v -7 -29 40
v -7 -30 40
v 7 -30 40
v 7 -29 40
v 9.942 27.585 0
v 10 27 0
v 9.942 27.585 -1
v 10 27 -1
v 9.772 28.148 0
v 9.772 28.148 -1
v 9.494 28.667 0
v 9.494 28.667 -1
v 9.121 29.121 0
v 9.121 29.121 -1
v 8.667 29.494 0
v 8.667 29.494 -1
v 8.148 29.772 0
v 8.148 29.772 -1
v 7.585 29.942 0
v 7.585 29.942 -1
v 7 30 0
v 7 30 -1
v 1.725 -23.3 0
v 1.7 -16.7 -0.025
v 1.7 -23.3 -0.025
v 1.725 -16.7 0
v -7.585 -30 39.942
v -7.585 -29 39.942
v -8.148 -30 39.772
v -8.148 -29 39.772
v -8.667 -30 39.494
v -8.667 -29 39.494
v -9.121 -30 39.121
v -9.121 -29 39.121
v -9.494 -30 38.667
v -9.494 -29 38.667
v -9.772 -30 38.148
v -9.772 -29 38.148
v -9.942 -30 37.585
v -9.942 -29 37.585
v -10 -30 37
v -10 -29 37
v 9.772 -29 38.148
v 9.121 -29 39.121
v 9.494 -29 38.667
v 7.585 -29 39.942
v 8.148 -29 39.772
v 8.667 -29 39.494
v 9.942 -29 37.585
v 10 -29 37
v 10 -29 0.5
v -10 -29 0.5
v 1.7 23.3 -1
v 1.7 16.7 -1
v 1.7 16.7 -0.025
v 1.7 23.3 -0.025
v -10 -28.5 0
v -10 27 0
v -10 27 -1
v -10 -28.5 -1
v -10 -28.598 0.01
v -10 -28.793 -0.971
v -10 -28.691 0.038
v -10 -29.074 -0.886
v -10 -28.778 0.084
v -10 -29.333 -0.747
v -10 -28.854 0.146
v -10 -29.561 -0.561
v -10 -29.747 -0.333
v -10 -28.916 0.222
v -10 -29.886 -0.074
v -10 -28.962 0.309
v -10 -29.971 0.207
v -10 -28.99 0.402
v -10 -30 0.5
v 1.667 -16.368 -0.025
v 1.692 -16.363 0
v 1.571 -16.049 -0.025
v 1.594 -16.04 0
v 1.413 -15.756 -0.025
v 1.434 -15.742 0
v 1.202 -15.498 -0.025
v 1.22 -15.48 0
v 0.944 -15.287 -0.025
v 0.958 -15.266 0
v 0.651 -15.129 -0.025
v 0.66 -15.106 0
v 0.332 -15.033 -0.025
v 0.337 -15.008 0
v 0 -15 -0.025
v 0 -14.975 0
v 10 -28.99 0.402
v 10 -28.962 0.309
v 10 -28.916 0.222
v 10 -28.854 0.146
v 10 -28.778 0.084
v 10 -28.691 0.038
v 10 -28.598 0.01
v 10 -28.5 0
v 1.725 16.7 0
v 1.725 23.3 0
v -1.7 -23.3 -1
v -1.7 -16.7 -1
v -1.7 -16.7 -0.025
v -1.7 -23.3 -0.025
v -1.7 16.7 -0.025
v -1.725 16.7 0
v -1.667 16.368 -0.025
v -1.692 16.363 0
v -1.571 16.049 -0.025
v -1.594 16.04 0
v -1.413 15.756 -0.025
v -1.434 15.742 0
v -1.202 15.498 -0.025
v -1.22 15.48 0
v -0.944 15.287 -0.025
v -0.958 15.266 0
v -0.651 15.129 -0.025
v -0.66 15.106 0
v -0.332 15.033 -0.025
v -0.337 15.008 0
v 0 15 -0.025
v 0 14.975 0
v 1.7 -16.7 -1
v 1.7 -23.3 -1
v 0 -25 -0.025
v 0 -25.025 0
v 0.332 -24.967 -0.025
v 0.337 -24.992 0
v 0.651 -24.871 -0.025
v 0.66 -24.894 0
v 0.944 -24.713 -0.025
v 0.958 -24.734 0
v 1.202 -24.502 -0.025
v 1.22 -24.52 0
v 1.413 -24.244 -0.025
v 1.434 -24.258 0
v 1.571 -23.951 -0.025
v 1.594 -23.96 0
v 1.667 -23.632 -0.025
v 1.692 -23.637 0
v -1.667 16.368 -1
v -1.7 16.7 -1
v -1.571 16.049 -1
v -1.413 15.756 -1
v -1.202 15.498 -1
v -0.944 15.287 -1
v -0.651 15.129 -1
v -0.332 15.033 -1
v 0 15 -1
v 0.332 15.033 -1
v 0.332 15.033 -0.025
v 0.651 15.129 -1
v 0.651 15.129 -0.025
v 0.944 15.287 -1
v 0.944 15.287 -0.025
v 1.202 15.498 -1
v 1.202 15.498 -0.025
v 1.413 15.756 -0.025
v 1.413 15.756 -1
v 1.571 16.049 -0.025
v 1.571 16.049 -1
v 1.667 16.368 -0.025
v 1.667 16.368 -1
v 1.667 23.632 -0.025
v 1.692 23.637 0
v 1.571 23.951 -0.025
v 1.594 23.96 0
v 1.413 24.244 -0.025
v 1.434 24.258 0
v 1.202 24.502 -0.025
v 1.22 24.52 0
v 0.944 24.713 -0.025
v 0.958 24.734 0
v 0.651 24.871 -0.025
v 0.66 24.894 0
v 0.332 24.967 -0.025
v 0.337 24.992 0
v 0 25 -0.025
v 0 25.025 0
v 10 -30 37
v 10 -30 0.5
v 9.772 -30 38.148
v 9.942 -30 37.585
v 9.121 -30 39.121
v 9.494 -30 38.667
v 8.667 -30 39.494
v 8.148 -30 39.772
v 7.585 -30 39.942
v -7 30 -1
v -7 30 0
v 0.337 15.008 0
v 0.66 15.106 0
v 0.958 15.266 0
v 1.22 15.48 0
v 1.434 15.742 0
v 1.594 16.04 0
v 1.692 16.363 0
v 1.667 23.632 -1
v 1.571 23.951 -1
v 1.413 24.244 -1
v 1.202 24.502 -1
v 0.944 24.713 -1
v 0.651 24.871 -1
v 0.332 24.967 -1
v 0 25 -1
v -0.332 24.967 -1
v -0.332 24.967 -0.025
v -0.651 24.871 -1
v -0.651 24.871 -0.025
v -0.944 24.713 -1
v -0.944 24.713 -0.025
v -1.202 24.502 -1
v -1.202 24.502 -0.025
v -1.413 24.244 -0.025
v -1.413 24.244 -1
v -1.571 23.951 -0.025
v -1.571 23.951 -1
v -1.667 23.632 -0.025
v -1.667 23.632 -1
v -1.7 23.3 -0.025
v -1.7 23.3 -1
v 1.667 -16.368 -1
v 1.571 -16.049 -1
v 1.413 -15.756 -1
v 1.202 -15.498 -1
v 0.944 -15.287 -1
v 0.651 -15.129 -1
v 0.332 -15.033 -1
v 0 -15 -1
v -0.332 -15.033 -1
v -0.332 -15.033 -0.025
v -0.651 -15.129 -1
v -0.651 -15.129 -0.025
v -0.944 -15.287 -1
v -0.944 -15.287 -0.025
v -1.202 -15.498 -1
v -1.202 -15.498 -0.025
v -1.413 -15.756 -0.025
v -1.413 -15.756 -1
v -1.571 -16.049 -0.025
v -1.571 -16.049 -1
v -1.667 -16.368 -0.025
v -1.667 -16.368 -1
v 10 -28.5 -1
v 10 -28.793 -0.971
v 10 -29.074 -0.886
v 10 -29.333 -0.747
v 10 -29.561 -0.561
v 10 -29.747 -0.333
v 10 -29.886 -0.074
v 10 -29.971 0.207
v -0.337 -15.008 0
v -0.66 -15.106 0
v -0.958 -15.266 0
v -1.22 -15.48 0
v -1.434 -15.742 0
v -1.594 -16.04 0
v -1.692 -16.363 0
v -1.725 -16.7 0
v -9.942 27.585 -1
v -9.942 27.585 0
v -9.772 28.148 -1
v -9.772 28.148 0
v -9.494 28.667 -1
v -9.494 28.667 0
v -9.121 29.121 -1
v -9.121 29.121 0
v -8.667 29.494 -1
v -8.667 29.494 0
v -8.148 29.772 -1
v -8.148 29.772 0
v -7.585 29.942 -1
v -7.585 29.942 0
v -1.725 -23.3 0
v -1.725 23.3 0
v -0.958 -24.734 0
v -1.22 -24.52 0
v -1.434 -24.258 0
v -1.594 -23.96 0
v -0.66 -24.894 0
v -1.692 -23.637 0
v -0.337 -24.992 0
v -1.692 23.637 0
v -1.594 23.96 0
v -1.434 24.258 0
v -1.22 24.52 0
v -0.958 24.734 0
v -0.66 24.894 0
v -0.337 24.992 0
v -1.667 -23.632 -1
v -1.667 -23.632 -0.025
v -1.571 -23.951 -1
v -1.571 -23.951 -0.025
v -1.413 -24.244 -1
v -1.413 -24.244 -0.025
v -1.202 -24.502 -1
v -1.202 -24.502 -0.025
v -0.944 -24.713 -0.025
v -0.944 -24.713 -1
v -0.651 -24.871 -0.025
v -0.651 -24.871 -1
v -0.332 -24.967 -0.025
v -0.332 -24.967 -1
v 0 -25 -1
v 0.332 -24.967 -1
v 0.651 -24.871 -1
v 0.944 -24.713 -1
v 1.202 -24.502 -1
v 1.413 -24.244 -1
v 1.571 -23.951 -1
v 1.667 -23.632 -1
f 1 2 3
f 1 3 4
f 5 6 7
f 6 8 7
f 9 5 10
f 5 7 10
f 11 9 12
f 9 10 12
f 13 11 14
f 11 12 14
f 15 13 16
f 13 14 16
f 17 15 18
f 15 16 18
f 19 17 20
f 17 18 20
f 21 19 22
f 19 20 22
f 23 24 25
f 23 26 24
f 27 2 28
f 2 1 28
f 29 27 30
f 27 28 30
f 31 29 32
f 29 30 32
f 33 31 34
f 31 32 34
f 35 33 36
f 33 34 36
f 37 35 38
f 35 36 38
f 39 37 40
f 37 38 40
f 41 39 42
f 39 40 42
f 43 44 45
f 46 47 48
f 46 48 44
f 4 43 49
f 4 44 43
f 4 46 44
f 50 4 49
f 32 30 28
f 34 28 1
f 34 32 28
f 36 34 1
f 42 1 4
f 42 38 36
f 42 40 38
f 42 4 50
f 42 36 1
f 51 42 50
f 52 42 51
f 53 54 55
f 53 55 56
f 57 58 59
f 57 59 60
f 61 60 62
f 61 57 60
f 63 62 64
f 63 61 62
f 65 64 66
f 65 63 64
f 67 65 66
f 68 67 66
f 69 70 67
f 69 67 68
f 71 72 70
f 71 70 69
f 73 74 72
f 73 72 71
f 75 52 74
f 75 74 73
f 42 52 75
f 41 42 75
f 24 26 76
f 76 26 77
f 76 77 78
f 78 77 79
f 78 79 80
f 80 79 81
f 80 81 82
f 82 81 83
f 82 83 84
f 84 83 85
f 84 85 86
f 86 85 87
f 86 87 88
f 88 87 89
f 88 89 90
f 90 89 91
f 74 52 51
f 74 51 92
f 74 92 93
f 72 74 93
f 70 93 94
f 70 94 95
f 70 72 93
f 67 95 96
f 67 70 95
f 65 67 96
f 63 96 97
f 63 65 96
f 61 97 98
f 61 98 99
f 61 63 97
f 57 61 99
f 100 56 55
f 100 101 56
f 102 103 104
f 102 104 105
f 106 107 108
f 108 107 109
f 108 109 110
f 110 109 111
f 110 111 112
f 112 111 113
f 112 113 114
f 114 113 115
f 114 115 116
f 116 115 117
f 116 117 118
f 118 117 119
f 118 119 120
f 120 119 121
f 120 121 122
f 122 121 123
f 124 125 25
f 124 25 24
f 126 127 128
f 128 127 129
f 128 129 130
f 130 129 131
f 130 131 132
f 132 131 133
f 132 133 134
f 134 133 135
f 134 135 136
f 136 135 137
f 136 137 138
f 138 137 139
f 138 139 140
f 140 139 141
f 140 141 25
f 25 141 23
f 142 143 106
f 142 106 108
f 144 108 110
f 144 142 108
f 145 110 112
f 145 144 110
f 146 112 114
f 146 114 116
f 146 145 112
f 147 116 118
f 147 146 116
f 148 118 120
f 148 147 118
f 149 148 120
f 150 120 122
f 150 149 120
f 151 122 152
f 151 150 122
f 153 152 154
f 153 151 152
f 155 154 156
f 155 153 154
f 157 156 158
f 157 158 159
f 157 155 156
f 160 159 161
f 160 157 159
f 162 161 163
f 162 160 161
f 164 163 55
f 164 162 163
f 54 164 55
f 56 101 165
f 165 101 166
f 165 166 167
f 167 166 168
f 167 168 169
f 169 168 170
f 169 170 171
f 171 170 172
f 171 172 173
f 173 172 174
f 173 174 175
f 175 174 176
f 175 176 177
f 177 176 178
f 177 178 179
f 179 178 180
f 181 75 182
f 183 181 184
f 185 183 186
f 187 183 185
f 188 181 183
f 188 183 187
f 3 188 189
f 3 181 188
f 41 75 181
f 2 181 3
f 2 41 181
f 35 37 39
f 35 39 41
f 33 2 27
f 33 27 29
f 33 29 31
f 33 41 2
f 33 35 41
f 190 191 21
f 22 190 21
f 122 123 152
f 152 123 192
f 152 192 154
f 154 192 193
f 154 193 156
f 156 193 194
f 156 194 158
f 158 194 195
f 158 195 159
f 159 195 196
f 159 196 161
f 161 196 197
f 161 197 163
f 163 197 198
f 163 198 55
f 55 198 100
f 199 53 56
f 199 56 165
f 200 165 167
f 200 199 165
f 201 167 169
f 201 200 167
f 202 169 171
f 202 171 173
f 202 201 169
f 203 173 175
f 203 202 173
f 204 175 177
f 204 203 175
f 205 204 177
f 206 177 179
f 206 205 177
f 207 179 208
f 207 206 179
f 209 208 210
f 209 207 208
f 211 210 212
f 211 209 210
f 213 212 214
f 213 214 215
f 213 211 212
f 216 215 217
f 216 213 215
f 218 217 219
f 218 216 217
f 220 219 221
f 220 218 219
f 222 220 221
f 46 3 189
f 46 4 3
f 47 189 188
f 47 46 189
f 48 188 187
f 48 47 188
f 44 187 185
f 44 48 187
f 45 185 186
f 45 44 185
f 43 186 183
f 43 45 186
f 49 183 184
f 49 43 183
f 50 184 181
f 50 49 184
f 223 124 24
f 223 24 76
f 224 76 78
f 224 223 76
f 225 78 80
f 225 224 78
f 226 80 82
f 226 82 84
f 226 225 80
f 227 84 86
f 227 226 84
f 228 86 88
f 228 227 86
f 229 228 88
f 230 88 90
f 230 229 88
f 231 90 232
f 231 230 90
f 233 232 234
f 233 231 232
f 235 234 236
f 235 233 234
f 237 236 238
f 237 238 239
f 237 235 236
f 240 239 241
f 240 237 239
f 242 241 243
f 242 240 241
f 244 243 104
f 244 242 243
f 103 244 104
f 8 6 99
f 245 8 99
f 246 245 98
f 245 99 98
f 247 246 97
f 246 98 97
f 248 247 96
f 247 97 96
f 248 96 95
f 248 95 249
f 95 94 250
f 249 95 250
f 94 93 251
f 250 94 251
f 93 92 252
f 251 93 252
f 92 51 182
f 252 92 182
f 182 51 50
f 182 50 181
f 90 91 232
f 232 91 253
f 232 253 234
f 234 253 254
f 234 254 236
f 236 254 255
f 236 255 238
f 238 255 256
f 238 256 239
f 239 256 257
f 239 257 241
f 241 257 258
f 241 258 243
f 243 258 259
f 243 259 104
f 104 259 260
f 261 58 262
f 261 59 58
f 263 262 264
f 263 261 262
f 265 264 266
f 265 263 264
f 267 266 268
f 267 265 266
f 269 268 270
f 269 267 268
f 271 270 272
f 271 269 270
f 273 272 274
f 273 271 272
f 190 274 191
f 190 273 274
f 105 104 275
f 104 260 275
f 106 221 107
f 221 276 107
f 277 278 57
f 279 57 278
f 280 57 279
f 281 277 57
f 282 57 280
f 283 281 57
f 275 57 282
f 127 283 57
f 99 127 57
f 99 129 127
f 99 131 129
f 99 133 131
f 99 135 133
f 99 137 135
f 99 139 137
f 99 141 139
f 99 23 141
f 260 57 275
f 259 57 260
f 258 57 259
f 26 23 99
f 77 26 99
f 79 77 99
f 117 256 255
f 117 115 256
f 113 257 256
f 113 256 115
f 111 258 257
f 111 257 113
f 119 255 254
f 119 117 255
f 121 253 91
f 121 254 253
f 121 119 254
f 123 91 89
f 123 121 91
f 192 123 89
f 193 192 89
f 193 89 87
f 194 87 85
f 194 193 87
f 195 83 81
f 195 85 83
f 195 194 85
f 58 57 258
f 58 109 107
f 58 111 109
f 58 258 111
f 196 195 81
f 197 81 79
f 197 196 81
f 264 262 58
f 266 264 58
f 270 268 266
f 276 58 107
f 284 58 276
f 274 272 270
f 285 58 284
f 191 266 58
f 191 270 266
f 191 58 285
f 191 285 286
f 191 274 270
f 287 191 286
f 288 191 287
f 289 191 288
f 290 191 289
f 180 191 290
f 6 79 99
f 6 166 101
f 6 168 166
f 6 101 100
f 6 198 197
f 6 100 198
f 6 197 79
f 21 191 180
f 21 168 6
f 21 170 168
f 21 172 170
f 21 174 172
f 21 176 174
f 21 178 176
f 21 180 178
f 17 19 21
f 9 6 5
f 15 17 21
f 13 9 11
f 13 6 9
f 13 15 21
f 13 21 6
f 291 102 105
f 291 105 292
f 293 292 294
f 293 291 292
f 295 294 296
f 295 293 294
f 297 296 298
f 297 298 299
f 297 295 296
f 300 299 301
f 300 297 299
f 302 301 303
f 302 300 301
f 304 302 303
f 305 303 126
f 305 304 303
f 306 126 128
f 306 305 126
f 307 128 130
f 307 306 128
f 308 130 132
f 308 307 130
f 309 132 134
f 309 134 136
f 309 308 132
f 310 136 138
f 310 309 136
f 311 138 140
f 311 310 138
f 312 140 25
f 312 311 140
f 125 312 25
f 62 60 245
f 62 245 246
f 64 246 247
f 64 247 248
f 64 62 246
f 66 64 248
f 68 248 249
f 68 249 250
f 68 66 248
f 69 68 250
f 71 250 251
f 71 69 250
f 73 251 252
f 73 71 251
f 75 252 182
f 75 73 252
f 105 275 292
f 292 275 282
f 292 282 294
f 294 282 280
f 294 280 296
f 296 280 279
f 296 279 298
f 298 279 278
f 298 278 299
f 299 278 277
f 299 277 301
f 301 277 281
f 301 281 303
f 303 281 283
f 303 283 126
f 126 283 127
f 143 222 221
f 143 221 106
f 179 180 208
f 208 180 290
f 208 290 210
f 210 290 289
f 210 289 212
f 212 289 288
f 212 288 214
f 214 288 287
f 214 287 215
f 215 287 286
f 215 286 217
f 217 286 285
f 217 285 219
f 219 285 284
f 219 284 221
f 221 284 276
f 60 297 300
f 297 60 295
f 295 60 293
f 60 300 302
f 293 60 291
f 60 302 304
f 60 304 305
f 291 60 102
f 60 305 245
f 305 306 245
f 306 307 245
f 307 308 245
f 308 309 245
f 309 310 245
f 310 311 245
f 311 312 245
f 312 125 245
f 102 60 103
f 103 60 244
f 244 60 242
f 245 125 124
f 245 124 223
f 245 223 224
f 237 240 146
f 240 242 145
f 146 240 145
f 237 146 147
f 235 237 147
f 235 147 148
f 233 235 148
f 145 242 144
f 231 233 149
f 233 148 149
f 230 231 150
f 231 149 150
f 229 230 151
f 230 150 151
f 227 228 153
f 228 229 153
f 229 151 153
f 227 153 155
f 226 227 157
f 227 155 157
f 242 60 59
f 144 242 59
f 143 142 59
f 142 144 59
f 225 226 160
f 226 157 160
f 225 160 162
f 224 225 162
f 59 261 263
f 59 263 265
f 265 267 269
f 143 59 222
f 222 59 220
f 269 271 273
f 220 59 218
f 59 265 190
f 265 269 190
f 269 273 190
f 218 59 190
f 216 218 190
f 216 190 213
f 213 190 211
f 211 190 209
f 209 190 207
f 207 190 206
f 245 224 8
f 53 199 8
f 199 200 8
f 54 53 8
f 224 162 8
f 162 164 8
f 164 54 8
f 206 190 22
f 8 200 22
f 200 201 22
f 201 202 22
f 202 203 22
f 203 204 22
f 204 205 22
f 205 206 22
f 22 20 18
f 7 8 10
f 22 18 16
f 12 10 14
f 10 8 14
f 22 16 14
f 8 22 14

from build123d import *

# Parameters (mm, degrees)
SKETCH1_W                    = 20
SKETCH1_H                    = 60
BASE_FLANGE1_DEPTH           = 1
EDGE_FLANGE1_STRIP_W         = 5
EDGE_FLANGE1_STRIP_H         = 1
EDGE_FLANGE1_STRIP_CUT_DEPTH = 20
EDGE_FLANGE1_DEPTH           = 20
FILLET1_R                    = 3
M3_START                     = -1
M3_CLEARANCE_SLOT4_DEPTH     = 1


with BuildPart() as part:
    # Base-Flange1: sheet metal written as solids
    # Sketch1 → Base-Flange1 (new body)
    with BuildSketch(Plane.XY):
        Rectangle(SKETCH1_W, SKETCH1_H)
    extrude(amount=-BASE_FLANGE1_DEPTH)

    # Edge-Flange1: sheet metal written as solids
    # Edge-Flange1 strip (on a plane across the edge) → Edge-Flange1 strip cut (cut)
    with BuildSketch(Plane(origin=(-10, -30, 0), x_dir=(0, 1, 0), z_dir=(1, 0, 0))):
        with Locations((-1, -0.5)):
            Rectangle(EDGE_FLANGE1_STRIP_W, EDGE_FLANGE1_STRIP_H)
    extrude(amount=EDGE_FLANGE1_STRIP_CUT_DEPTH, mode=Mode.SUBTRACT)

    # Edge-Flange1 section (on a plane across the edge) → Edge-Flange1 (add)
    with BuildSketch(Plane(origin=(-10, -30, 0), x_dir=(0, 1, 0), z_dir=(1, 0, 0))):
        with BuildLine():
            Line((0, 0.5), (0, 40))
            Line((0, 40), (1, 40))
            Line((1, 40), (1, 0.5))
            ThreePointArc((1, 0.5), (1.146446609, 0.146446609), (1.5, 0))
            Line((1.5, 0), (1.5, -1))
            ThreePointArc((1.5, -1), (0.439339828, -0.560660172), (0, 0.5))
        make_face()
    extrude(amount=EDGE_FLANGE1_DEPTH)

    # Fillet1
    fillet1_edges = [part.edges().sort_by_distance(p)[0] for p in [
        (-10, -29.5, 40),
        (10, -29.5, 40),
        (-10, 30, -0.5),
        (10, 30, -0.5),
    ]]
    fillet(fillet1_edges, radius=FILLET1_R)

    # M3 Clearance Slot4: read off the stored shape, not the designer's step
    # M3 Clearance Slot4 outline → M3 Clearance Slot4 (cut)
    with BuildSketch(Plane.XY.offset(M3_START)):
        with BuildLine():
            Line((1.7, -23.3), (1.7, -16.7))
            ThreePointArc((1.7, -16.7), (0, -15), (-1.7, -16.7))
            Line((-1.7, -16.7), (-1.7, -23.3))
            ThreePointArc((-1.7, -23.3), (0, -25), (1.7, -23.3))
        make_face()
        with BuildLine():
            ThreePointArc((1.7, 23.3), (0, 25), (-1.7, 23.3))
            Line((-1.7, 23.3), (-1.7, 16.7))
            ThreePointArc((-1.7, 16.7), (0, 15), (1.7, 16.7))
            Line((1.7, 16.7), (1.7, 23.3))
        make_face()
    extrude(amount=M3_CLEARANCE_SLOT4_DEPTH, mode=Mode.SUBTRACT)

    # M3 Clearance Slot4 2: loft between two sections, ruled curve by curve
    m3_clearance_slot4_2_from = [
        Edge.make_three_point_arc((1.7, -16.7, -0.025), (1.202081528, -15.497918472, -0.025), (0, -15, -0.025)),
        Edge.make_three_point_arc((0, -15, -0.025), (-1.202081528, -15.497918472, -0.025), (-1.7, -16.7, -0.025)),
        Edge.make_three_point_arc((-1.7, -23.3, -0.025), (-1.202081528, -24.502081528, -0.025), (0, -25, -0.025)),
        Edge.make_three_point_arc((0, -25, -0.025), (1.202081528, -24.502081528, -0.025), (1.7, -23.3, -0.025)),
        Edge.make_line((-1.7, -16.7, -0.025), (-1.7, -23.3, -0.025)),
        Edge.make_line((1.7, -16.7, -0.025), (1.7, -23.3, -0.025)),
    ]
    m3_clearance_slot4_2_to = [
        Edge.make_three_point_arc((1.725, -16.7, 0), (1.219759198, -15.480240802, 0), (0, -14.975, 0)),
        Edge.make_three_point_arc((0, -14.975, 0), (-1.219759198, -15.480240802, 0), (-1.725, -16.7, 0)),
        Edge.make_three_point_arc((-1.725, -23.3, 0), (-1.219759198, -24.519759198, 0), (0, -25.025, 0)),
        Edge.make_three_point_arc((0, -25.025, 0), (1.219759198, -24.519759198, 0), (1.725, -23.3, 0)),
        Edge.make_line((-1.725, -16.7, 0), (-1.725, -23.3, 0)),
        Edge.make_line((1.725, -16.7, 0), (1.725, -23.3, 0)),
    ]
    m3_clearance_slot4_2 = Solid(Shell([*[Face.make_surface_from_curves(m3_clearance_slot4_2_from[k], m3_clearance_slot4_2_to[k]) for k in range(6)], Face(Wire(m3_clearance_slot4_2_from)), Face(Wire(m3_clearance_slot4_2_to))]))
    add(m3_clearance_slot4_2, mode=Mode.SUBTRACT)

    # M3 Clearance Slot4 3: loft between two sections, ruled curve by curve
    m3_clearance_slot4_3_from = [
        Edge.make_three_point_arc((1.7, 23.3, -0.025), (1.202081528, 24.502081528, -0.025), (0, 25, -0.025)),
        Edge.make_three_point_arc((0, 25, -0.025), (-1.202081528, 24.502081528, -0.025), (-1.7, 23.3, -0.025)),
        Edge.make_three_point_arc((-1.7, 16.7, -0.025), (-1.202081528, 15.497918472, -0.025), (0, 15, -0.025)),
        Edge.make_three_point_arc((0, 15, -0.025), (1.202081528, 15.497918472, -0.025), (1.7, 16.7, -0.025)),
        Edge.make_line((-1.7, 23.3, -0.025), (-1.7, 16.7, -0.025)),
        Edge.make_line((1.7, 23.3, -0.025), (1.7, 16.7, -0.025)),
    ]
    m3_clearance_slot4_3_to = [
        Edge.make_three_point_arc((1.725, 23.3, 0), (1.219759198, 24.519759198, 0), (0, 25.025, 0)),
        Edge.make_three_point_arc((0, 25.025, 0), (-1.219759198, 24.519759198, 0), (-1.725, 23.3, 0)),
        Edge.make_three_point_arc((-1.725, 16.7, 0), (-1.219759198, 15.480240802, 0), (0, 14.975, 0)),
        Edge.make_three_point_arc((0, 14.975, 0), (1.219759198, 15.480240802, 0), (1.725, 16.7, 0)),
        Edge.make_line((-1.725, 23.3, 0), (-1.725, 16.7, 0)),
        Edge.make_line((1.725, 23.3, 0), (1.725, 16.7, 0)),
    ]
    m3_clearance_slot4_3 = Solid(Shell([*[Face.make_surface_from_curves(m3_clearance_slot4_3_from[k], m3_clearance_slot4_3_to[k]) for k in range(6)], Face(Wire(m3_clearance_slot4_3_from)), Face(Wire(m3_clearance_slot4_3_to))]))
    add(m3_clearance_slot4_3, mode=Mode.SUBTRACT)


solid = part.part
